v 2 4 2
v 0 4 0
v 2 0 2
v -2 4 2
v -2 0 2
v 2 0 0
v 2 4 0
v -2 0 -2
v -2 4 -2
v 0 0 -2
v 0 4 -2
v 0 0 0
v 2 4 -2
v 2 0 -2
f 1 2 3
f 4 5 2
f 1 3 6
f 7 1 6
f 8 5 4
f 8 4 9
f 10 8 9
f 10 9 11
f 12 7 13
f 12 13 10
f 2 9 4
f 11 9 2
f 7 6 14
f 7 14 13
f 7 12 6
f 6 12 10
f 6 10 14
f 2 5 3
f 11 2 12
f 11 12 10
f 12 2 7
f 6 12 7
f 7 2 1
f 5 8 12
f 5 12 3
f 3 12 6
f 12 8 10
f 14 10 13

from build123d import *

# Parameters (mm, degrees)
SKETCH2_W           = 4
SKETCH2_H           = 4
BOSS_EXTRUDE1_DEPTH = 4
CUT_EXTRUDE1_DEPTH  = 10
SKETCH5_W           = 2
SKETCH5_H           = 2
CUT_EXTRUDE5_DEPTH  = 10
BOSS_EXTRUDE4_DEPTH = 2


with BuildPart() as part:
    # Sketch2 → Boss-Extrude1 (new body)
    with BuildSketch(Plane(origin=(0, 0, 0), x_dir=(1, 0, 0), z_dir=(0, 1, 0))):
        Rectangle(SKETCH2_W, SKETCH2_H)
    extrude(amount=BOSS_EXTRUDE1_DEPTH)

    # 3DSketch1 → Cut-Extrude1 (cut, along a direction that is not the sketch's normal)
    with BuildSketch(Plane(origin=(-2, 0, 2), x_dir=(0.4082482904638631, 0.8164965809277261, -0.4082482904638631), z_dir=(0, -0.447213595499958, -0.894427190999916))):
        Polygon((0, 0), (4.898979486, 0), (1.632993162, 3.651483717), align=None)
    extrude(amount=-CUT_EXTRUDE1_DEPTH, dir=(0, -1, 0), mode=Mode.SUBTRACT)

    # Sketch5 → Cut-Extrude5 (cut)
    with BuildSketch(Plane(origin=(0, 4, 0), x_dir=(1, 0, 0), z_dir=(0, 1, 0))):
        with Locations((1, 1)):
            Rectangle(SKETCH5_W, SKETCH5_H)
    extrude(amount=-CUT_EXTRUDE5_DEPTH, mode=Mode.SUBTRACT)


with BuildPart() as body_2:
    # Sketch6 → Boss-Extrude4 (new body)
    with BuildSketch(Plane(origin=(0, 0, 0), x_dir=(-1, 0, 0), z_dir=(0, 0, -1))):
        Polygon((-2, 4), (0, 0), (-2, 0), align=None)
    extrude(amount=BOSS_EXTRUDE4_DEPTH)


solid = Compound([part.part, body_2.part])
